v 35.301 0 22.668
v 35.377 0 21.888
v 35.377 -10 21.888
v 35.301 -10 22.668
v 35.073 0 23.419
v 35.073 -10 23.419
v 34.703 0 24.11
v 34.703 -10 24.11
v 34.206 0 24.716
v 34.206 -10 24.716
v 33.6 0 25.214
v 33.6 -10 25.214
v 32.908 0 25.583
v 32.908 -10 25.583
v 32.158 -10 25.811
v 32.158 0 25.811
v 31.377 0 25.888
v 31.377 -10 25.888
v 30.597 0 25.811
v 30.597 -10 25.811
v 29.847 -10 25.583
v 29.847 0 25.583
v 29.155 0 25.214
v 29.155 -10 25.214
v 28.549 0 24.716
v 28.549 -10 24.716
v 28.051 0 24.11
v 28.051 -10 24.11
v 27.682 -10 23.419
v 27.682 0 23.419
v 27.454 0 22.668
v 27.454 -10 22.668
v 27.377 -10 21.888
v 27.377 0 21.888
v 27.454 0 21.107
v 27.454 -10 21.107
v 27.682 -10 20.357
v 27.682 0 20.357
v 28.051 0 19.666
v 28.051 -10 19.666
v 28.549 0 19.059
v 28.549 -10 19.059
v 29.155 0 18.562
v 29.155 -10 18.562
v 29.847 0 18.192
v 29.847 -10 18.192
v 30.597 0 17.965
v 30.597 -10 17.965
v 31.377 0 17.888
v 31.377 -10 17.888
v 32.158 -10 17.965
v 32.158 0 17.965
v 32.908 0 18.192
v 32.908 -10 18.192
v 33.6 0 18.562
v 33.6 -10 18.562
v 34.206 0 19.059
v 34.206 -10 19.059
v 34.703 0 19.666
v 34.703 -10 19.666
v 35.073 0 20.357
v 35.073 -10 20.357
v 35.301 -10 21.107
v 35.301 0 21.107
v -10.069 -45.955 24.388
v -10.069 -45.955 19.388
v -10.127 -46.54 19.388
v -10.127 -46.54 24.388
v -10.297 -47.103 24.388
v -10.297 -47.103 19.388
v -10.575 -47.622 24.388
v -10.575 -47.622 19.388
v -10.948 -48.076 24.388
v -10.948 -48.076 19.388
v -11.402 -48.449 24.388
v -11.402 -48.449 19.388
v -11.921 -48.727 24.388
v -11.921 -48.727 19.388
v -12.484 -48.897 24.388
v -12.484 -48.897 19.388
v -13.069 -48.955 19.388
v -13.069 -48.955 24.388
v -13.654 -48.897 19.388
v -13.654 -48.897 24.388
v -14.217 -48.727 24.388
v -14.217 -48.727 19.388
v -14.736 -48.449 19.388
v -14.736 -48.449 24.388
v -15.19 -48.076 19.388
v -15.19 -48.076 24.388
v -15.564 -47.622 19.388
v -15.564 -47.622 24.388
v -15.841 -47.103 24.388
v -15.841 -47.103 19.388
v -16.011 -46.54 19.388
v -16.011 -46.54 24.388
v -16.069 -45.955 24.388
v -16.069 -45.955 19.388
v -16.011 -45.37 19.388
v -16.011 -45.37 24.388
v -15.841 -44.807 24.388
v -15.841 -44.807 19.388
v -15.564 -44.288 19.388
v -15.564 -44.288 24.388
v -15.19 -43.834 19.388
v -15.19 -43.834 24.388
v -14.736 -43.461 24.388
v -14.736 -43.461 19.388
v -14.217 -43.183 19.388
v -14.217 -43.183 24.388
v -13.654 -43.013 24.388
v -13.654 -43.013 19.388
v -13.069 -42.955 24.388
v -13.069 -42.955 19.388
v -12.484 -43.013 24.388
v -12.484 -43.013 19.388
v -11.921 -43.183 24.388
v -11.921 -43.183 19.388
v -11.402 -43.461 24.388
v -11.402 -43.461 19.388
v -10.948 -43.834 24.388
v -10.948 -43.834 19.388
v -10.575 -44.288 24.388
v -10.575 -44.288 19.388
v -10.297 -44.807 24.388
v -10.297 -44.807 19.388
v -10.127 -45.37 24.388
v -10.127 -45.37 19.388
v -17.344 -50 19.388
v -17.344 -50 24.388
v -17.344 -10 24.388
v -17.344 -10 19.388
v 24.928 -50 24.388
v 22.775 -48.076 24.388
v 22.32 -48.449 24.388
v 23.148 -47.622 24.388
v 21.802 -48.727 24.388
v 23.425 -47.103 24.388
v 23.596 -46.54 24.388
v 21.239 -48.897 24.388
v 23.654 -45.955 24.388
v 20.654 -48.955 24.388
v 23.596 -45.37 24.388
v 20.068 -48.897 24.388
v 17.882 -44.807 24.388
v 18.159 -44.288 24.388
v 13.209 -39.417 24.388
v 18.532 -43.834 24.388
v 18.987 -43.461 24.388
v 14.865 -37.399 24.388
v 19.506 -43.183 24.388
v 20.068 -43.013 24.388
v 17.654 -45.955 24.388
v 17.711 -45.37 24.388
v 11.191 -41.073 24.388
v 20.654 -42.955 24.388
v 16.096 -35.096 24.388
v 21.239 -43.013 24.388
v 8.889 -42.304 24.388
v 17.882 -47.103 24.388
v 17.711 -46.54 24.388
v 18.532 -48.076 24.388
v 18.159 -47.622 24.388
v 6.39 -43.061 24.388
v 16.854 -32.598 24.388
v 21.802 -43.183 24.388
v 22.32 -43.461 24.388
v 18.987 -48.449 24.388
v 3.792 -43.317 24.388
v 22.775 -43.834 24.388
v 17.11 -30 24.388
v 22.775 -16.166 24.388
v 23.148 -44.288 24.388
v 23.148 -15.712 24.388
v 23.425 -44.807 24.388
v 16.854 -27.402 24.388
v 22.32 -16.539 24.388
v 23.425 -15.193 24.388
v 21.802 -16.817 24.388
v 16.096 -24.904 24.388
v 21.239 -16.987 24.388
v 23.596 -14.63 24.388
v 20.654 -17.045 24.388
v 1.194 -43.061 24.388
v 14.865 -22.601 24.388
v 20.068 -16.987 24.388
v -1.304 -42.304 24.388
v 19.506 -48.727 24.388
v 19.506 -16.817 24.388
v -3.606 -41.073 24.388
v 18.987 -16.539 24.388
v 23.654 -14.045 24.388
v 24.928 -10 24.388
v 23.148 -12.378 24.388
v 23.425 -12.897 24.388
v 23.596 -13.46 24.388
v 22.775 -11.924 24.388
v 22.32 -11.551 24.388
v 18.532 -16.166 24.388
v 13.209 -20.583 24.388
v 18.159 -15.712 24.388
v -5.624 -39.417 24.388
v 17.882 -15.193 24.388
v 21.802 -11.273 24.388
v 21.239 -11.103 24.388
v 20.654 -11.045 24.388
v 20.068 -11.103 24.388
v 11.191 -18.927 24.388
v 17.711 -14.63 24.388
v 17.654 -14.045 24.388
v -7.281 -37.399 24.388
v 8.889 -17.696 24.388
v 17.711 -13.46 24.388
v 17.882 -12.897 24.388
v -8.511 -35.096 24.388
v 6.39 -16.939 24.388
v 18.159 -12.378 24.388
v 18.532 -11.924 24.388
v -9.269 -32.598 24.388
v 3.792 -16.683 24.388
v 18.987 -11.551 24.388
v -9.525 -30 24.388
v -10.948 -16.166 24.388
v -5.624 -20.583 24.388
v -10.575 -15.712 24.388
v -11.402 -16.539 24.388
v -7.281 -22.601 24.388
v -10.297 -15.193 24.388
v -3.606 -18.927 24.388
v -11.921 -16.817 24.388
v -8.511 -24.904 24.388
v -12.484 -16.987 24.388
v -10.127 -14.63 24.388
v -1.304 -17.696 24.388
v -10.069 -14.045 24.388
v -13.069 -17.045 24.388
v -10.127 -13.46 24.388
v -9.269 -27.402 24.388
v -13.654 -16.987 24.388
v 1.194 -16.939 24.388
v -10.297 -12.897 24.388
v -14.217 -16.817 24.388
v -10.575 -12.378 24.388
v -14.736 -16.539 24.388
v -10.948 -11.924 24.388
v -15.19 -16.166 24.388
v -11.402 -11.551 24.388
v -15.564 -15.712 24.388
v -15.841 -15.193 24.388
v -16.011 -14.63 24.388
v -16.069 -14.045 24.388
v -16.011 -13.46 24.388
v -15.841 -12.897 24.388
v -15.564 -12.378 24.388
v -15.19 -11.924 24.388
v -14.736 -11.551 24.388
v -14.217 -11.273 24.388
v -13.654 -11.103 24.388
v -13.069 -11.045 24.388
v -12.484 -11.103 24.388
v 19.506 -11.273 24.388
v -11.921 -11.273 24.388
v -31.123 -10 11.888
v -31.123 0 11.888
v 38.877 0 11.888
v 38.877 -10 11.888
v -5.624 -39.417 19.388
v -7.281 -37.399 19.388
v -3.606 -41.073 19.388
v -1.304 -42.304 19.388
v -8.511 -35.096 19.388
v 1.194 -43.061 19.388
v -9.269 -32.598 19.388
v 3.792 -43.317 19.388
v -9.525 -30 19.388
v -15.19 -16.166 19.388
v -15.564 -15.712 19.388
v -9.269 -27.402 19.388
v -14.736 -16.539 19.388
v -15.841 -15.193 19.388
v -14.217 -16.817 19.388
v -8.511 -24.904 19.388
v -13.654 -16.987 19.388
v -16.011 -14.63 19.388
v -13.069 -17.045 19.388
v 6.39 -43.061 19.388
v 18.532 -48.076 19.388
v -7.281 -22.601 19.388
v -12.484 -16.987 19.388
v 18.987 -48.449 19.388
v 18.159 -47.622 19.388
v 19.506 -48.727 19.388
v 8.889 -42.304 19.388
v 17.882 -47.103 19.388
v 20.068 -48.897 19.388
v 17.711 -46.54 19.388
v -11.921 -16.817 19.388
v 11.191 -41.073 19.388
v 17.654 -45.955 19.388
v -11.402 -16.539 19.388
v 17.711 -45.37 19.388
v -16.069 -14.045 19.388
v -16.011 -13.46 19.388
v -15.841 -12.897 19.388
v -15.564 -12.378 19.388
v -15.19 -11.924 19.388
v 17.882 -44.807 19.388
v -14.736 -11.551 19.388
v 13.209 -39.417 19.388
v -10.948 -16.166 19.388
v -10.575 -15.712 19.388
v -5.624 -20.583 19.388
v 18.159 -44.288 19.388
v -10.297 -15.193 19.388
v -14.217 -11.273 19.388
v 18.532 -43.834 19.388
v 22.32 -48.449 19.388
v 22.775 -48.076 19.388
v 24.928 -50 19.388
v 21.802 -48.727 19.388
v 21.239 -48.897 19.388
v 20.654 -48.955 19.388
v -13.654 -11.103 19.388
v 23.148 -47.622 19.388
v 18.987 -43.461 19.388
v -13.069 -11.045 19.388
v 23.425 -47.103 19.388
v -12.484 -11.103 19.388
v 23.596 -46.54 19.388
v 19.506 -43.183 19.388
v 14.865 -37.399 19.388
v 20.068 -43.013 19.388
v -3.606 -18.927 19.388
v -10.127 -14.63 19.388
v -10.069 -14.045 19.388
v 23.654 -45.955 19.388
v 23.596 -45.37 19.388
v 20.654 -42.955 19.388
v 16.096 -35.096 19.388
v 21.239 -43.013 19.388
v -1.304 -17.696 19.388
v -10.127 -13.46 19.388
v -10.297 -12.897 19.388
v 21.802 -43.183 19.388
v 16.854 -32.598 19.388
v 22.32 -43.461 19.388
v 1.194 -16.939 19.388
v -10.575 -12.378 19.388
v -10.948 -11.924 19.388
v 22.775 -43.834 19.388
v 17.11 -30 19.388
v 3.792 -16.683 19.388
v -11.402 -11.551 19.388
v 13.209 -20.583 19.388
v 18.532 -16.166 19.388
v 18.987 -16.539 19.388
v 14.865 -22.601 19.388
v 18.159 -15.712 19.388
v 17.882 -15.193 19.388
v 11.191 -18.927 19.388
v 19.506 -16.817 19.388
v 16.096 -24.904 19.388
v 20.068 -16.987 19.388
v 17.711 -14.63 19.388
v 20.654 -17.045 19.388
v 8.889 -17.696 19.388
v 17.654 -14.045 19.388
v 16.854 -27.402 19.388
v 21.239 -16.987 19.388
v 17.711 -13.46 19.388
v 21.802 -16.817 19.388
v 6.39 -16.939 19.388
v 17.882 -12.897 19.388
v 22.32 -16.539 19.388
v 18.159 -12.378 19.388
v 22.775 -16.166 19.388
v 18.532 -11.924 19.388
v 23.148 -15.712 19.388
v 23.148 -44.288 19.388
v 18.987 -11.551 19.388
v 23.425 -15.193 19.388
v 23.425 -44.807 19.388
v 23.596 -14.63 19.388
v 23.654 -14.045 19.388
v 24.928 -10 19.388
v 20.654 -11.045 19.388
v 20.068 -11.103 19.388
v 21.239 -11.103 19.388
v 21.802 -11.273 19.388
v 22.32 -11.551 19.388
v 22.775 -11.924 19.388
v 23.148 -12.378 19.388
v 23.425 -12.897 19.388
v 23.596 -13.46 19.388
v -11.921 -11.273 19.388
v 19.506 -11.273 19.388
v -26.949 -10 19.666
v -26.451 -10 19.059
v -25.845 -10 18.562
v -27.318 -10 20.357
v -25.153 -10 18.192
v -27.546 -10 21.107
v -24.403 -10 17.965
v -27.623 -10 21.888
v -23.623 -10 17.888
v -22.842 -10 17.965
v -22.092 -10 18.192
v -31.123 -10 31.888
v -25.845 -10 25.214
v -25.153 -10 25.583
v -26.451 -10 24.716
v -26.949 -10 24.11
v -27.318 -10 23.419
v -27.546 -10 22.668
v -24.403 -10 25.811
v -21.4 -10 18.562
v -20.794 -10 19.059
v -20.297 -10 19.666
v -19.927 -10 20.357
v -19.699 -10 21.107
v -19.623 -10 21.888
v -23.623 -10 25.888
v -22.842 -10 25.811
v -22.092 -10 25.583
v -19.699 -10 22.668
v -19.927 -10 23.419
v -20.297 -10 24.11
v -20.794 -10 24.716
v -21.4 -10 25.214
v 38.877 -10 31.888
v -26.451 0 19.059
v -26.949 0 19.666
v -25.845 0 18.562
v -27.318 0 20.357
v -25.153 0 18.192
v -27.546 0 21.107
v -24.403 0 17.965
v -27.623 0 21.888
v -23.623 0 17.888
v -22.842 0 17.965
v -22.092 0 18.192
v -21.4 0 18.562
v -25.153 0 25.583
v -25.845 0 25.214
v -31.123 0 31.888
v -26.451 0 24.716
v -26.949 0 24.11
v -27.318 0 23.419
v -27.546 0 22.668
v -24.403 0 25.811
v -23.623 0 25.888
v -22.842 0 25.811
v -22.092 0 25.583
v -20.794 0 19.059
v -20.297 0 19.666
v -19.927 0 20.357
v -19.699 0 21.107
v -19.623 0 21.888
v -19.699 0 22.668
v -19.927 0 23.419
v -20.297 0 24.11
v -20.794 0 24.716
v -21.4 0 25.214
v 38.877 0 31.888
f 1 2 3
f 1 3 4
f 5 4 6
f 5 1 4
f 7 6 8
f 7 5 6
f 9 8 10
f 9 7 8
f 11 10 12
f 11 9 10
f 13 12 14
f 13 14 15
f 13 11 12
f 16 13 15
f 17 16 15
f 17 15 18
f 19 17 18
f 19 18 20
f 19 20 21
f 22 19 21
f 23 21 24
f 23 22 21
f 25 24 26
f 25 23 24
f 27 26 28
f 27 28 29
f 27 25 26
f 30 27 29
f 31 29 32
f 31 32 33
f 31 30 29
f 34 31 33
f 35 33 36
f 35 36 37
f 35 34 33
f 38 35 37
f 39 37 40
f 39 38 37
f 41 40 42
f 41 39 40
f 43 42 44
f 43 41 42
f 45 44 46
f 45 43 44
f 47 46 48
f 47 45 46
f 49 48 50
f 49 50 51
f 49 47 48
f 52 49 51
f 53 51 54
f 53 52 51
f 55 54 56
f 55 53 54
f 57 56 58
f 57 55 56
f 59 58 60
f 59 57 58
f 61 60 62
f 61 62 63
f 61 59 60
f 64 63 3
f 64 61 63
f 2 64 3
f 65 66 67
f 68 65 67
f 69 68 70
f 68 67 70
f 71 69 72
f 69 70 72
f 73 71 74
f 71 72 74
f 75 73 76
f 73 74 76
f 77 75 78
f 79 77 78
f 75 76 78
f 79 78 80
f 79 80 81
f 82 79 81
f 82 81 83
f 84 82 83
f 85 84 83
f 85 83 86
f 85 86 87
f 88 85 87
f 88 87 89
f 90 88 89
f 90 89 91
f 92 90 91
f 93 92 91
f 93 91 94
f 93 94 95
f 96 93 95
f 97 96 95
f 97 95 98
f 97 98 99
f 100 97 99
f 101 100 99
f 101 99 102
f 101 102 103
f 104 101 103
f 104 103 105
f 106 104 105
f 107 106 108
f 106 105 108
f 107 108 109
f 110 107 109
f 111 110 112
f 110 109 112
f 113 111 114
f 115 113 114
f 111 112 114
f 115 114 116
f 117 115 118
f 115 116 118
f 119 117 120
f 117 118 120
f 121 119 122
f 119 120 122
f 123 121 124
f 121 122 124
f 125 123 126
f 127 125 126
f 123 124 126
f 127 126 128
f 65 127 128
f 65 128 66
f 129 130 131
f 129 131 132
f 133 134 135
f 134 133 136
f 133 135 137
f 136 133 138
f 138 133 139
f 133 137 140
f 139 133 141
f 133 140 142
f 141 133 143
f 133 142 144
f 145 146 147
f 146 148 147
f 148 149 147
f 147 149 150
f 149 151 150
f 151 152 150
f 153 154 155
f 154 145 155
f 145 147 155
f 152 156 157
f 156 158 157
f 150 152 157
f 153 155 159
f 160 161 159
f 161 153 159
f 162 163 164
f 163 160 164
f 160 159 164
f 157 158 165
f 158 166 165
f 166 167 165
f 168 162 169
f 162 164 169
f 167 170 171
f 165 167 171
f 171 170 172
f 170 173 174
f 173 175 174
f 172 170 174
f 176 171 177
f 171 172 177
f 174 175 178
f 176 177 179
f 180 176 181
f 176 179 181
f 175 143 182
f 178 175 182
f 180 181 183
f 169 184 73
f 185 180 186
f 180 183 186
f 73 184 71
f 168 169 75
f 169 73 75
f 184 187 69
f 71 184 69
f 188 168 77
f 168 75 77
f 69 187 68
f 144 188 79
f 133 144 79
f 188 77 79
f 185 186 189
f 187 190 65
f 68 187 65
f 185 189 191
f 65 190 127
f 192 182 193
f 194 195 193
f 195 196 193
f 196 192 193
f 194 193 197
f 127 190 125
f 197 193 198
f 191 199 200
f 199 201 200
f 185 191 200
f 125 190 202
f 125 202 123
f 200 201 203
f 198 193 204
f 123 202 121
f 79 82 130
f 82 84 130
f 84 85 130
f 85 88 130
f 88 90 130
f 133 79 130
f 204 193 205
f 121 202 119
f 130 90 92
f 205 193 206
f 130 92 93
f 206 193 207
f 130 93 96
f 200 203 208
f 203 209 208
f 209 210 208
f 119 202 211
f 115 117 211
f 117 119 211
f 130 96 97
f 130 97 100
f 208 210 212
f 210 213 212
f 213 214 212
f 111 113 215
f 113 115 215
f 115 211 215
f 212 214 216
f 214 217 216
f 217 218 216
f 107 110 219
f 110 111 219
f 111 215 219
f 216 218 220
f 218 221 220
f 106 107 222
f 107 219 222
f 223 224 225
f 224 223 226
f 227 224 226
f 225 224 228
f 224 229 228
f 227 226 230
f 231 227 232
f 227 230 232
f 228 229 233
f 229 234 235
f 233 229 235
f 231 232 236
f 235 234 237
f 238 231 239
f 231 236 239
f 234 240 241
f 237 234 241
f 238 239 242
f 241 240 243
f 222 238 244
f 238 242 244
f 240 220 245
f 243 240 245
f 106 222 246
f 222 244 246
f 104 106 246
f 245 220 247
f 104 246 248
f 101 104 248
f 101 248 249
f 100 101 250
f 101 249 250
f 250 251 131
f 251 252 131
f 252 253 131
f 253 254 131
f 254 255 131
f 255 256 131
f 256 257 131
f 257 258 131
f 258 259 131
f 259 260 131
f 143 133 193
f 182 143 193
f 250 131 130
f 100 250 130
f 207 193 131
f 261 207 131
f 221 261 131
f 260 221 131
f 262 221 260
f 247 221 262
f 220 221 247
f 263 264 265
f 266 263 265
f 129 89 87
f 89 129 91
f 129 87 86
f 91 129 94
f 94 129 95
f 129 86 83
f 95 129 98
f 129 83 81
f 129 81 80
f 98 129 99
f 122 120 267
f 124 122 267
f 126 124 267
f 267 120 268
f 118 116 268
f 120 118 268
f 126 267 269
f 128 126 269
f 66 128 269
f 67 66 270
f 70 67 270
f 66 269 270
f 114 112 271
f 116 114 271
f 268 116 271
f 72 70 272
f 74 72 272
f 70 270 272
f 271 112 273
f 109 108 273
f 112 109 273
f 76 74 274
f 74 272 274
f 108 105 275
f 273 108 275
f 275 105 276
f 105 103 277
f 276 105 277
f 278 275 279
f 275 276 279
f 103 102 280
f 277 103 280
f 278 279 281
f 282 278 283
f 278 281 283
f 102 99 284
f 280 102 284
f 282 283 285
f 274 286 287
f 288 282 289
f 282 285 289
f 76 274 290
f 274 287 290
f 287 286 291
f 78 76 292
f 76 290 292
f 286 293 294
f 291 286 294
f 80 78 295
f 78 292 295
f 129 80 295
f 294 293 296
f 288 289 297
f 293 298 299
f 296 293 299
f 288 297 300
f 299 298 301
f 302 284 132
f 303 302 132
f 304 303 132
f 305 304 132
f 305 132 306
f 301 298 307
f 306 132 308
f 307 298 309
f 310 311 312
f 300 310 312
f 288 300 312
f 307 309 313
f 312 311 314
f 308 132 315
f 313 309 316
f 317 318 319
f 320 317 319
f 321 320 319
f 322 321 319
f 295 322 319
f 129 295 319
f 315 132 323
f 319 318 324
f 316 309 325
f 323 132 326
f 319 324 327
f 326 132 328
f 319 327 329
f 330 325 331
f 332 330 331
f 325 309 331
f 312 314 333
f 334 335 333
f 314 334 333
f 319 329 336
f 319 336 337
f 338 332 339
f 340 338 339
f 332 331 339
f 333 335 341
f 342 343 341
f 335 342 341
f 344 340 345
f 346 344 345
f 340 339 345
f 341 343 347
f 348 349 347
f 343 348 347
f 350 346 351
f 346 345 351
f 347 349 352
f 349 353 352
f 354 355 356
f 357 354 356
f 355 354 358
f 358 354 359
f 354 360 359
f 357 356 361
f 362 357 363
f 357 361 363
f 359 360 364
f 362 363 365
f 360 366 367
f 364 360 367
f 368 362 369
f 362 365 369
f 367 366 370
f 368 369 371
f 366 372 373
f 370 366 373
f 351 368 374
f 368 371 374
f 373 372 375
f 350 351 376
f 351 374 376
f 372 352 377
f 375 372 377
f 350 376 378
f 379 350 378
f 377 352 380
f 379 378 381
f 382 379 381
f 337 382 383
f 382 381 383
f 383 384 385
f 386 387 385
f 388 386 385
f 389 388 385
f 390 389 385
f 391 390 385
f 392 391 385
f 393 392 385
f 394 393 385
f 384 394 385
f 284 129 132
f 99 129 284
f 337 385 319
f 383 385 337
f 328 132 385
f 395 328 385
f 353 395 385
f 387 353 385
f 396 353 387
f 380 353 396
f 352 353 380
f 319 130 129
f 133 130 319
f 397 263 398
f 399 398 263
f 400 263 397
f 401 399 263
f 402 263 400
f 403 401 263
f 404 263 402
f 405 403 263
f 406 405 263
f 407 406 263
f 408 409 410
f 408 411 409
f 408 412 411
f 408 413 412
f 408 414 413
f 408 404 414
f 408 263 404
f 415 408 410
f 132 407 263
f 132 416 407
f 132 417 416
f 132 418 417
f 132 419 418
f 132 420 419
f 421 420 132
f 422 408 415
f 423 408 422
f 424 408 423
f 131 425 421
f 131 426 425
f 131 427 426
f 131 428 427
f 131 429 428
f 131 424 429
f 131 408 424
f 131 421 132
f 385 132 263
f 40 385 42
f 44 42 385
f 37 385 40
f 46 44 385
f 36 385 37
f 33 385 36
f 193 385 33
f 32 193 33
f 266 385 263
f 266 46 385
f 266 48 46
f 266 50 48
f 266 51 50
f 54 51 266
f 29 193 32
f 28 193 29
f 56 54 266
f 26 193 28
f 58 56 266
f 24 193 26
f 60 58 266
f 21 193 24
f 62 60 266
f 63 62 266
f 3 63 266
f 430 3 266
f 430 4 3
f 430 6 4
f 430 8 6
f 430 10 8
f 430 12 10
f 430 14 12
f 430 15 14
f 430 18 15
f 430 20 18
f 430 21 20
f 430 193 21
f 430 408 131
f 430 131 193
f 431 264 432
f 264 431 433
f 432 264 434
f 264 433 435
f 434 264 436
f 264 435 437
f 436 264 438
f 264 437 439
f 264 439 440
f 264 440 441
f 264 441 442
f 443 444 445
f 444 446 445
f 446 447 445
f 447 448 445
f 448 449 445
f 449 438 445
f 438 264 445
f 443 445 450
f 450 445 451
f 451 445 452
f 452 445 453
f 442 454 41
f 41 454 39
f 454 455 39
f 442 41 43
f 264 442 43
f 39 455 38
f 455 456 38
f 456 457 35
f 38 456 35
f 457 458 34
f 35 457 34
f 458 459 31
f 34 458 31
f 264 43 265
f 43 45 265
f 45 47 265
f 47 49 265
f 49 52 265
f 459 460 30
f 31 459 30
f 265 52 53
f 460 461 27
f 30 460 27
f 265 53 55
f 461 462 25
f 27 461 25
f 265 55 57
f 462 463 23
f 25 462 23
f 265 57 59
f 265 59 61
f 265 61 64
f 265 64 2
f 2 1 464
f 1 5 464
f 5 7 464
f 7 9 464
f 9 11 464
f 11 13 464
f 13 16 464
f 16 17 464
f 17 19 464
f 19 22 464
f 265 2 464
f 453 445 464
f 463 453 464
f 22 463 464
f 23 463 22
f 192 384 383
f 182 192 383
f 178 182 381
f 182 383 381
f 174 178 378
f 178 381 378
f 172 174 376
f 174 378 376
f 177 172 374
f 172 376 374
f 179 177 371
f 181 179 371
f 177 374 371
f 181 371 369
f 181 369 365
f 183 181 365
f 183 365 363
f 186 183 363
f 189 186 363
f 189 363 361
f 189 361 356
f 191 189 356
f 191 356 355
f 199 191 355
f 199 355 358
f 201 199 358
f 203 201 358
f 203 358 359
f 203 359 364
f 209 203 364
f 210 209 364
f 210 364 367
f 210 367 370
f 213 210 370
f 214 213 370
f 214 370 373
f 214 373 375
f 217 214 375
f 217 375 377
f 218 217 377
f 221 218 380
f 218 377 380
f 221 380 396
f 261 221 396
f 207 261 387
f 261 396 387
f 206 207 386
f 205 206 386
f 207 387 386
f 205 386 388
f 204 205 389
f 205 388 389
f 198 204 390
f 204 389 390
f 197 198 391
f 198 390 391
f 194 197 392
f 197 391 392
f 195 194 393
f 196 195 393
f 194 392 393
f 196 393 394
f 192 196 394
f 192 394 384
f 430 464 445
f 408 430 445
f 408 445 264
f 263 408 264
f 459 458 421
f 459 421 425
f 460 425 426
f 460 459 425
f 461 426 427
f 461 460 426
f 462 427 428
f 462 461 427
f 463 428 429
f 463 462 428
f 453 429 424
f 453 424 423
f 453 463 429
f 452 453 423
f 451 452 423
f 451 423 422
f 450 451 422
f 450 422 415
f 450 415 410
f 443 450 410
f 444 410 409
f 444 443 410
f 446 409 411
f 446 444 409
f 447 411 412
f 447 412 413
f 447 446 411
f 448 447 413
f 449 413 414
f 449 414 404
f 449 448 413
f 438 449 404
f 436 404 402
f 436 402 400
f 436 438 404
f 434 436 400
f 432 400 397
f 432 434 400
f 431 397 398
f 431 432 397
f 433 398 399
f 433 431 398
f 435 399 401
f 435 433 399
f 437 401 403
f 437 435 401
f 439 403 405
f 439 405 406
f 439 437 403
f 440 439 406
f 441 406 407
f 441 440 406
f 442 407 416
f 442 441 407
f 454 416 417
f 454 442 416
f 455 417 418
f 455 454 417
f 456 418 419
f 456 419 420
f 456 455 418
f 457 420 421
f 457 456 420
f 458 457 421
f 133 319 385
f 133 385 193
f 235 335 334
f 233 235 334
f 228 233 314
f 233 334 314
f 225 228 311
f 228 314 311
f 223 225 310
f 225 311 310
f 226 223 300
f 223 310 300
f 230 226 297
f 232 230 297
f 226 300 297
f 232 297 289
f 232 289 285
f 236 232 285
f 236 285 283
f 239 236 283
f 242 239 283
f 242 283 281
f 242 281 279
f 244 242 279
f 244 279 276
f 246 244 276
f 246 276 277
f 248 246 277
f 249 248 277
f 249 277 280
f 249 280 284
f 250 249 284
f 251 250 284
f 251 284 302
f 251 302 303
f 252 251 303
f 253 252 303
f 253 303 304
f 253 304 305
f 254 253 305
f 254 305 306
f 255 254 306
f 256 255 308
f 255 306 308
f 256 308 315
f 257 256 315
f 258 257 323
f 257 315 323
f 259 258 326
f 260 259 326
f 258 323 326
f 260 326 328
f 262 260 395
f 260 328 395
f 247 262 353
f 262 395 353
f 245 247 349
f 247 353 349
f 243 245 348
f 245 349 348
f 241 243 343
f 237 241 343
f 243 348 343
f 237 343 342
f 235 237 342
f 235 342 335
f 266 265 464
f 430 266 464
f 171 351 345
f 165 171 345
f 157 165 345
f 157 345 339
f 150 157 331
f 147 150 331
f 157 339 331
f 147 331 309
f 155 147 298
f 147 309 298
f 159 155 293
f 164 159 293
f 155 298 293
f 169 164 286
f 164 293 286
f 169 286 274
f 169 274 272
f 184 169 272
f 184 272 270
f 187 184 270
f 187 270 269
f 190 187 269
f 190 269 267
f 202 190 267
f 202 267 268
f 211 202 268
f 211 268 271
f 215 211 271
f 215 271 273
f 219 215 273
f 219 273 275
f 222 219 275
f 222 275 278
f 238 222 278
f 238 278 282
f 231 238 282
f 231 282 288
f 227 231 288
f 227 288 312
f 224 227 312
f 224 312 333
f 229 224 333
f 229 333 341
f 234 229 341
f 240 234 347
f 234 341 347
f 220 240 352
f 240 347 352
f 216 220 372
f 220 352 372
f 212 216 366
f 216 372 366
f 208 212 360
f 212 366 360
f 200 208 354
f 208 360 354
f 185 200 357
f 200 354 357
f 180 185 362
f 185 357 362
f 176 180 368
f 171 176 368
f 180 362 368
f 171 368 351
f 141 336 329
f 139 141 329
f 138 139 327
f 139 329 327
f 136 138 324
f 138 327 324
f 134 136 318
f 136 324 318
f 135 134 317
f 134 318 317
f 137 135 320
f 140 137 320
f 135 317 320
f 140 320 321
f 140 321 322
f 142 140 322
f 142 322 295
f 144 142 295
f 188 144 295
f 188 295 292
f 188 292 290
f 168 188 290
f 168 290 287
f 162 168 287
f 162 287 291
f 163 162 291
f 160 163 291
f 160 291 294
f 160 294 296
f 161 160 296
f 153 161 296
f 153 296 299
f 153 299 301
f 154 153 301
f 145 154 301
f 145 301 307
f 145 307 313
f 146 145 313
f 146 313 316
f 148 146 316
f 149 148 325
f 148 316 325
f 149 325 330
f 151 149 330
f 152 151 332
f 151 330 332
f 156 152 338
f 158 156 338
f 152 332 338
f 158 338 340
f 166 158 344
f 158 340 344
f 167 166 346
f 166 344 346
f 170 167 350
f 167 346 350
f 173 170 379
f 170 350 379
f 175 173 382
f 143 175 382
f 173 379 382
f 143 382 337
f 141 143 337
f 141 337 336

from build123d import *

# Parameters (mm, degrees)
F0_R     = 4
F1_DEPTH = 10
F3_DEPTH = 40
F4_R     = 3
F4_R_2   = 13.31729
F5_DEPTH = 25


with BuildPart() as f1:
    # F0 (on Front) → F1 (new body)
    with BuildSketch(Plane.XZ):
        Polygon((38.877375, 31.887809), (-31.122625, 31.887809), (-31.122625, 11.887809), (-16.122625, 11.887809), (23.877375, 11.887809), (38.877375, 11.887809), align=None)
        with Locations((-23.622625, 21.887809)):
            Circle(F0_R, mode=Mode.SUBTRACT)
        with Locations((31.377375, 21.887809)):
            Circle(F0_R, mode=Mode.SUBTRACT)
    extrude(amount=F1_DEPTH)

    # F2 (on face) → F3 (join)
    with BuildSketch(Plane.XZ.offset(10)):
        Polygon((-17.34383, 19.387809), (-16.122625, 19.387809), (23.877375, 19.387809), (24.928454, 19.387809), (24.928454, 24.387809), (23.877375, 24.387809), (-16.122625, 24.387809), (-17.34383, 24.387809), align=None)
    extrude(amount=F3_DEPTH)

    # F4 (on face) → F5 (cut)
    with BuildSketch(Plane(origin=(0, 0, 19.387809), x_dir=(1, 0, 0), z_dir=(0, 0, -1))):
        with Locations((20.653736, 14.044937)):
            Circle(F4_R)
        with Locations((-13.069112, 14.044937)):
            Circle(F4_R)
        with Locations((-13.069112, 45.955063)):
            Circle(F4_R)
        with Locations((20.653736, 45.955063)):
            Circle(F4_R)
        with Locations((3.792312, 30)):
            Circle(F4_R_2)
    extrude(amount=-F5_DEPTH, mode=Mode.SUBTRACT)


solid = f1.part
